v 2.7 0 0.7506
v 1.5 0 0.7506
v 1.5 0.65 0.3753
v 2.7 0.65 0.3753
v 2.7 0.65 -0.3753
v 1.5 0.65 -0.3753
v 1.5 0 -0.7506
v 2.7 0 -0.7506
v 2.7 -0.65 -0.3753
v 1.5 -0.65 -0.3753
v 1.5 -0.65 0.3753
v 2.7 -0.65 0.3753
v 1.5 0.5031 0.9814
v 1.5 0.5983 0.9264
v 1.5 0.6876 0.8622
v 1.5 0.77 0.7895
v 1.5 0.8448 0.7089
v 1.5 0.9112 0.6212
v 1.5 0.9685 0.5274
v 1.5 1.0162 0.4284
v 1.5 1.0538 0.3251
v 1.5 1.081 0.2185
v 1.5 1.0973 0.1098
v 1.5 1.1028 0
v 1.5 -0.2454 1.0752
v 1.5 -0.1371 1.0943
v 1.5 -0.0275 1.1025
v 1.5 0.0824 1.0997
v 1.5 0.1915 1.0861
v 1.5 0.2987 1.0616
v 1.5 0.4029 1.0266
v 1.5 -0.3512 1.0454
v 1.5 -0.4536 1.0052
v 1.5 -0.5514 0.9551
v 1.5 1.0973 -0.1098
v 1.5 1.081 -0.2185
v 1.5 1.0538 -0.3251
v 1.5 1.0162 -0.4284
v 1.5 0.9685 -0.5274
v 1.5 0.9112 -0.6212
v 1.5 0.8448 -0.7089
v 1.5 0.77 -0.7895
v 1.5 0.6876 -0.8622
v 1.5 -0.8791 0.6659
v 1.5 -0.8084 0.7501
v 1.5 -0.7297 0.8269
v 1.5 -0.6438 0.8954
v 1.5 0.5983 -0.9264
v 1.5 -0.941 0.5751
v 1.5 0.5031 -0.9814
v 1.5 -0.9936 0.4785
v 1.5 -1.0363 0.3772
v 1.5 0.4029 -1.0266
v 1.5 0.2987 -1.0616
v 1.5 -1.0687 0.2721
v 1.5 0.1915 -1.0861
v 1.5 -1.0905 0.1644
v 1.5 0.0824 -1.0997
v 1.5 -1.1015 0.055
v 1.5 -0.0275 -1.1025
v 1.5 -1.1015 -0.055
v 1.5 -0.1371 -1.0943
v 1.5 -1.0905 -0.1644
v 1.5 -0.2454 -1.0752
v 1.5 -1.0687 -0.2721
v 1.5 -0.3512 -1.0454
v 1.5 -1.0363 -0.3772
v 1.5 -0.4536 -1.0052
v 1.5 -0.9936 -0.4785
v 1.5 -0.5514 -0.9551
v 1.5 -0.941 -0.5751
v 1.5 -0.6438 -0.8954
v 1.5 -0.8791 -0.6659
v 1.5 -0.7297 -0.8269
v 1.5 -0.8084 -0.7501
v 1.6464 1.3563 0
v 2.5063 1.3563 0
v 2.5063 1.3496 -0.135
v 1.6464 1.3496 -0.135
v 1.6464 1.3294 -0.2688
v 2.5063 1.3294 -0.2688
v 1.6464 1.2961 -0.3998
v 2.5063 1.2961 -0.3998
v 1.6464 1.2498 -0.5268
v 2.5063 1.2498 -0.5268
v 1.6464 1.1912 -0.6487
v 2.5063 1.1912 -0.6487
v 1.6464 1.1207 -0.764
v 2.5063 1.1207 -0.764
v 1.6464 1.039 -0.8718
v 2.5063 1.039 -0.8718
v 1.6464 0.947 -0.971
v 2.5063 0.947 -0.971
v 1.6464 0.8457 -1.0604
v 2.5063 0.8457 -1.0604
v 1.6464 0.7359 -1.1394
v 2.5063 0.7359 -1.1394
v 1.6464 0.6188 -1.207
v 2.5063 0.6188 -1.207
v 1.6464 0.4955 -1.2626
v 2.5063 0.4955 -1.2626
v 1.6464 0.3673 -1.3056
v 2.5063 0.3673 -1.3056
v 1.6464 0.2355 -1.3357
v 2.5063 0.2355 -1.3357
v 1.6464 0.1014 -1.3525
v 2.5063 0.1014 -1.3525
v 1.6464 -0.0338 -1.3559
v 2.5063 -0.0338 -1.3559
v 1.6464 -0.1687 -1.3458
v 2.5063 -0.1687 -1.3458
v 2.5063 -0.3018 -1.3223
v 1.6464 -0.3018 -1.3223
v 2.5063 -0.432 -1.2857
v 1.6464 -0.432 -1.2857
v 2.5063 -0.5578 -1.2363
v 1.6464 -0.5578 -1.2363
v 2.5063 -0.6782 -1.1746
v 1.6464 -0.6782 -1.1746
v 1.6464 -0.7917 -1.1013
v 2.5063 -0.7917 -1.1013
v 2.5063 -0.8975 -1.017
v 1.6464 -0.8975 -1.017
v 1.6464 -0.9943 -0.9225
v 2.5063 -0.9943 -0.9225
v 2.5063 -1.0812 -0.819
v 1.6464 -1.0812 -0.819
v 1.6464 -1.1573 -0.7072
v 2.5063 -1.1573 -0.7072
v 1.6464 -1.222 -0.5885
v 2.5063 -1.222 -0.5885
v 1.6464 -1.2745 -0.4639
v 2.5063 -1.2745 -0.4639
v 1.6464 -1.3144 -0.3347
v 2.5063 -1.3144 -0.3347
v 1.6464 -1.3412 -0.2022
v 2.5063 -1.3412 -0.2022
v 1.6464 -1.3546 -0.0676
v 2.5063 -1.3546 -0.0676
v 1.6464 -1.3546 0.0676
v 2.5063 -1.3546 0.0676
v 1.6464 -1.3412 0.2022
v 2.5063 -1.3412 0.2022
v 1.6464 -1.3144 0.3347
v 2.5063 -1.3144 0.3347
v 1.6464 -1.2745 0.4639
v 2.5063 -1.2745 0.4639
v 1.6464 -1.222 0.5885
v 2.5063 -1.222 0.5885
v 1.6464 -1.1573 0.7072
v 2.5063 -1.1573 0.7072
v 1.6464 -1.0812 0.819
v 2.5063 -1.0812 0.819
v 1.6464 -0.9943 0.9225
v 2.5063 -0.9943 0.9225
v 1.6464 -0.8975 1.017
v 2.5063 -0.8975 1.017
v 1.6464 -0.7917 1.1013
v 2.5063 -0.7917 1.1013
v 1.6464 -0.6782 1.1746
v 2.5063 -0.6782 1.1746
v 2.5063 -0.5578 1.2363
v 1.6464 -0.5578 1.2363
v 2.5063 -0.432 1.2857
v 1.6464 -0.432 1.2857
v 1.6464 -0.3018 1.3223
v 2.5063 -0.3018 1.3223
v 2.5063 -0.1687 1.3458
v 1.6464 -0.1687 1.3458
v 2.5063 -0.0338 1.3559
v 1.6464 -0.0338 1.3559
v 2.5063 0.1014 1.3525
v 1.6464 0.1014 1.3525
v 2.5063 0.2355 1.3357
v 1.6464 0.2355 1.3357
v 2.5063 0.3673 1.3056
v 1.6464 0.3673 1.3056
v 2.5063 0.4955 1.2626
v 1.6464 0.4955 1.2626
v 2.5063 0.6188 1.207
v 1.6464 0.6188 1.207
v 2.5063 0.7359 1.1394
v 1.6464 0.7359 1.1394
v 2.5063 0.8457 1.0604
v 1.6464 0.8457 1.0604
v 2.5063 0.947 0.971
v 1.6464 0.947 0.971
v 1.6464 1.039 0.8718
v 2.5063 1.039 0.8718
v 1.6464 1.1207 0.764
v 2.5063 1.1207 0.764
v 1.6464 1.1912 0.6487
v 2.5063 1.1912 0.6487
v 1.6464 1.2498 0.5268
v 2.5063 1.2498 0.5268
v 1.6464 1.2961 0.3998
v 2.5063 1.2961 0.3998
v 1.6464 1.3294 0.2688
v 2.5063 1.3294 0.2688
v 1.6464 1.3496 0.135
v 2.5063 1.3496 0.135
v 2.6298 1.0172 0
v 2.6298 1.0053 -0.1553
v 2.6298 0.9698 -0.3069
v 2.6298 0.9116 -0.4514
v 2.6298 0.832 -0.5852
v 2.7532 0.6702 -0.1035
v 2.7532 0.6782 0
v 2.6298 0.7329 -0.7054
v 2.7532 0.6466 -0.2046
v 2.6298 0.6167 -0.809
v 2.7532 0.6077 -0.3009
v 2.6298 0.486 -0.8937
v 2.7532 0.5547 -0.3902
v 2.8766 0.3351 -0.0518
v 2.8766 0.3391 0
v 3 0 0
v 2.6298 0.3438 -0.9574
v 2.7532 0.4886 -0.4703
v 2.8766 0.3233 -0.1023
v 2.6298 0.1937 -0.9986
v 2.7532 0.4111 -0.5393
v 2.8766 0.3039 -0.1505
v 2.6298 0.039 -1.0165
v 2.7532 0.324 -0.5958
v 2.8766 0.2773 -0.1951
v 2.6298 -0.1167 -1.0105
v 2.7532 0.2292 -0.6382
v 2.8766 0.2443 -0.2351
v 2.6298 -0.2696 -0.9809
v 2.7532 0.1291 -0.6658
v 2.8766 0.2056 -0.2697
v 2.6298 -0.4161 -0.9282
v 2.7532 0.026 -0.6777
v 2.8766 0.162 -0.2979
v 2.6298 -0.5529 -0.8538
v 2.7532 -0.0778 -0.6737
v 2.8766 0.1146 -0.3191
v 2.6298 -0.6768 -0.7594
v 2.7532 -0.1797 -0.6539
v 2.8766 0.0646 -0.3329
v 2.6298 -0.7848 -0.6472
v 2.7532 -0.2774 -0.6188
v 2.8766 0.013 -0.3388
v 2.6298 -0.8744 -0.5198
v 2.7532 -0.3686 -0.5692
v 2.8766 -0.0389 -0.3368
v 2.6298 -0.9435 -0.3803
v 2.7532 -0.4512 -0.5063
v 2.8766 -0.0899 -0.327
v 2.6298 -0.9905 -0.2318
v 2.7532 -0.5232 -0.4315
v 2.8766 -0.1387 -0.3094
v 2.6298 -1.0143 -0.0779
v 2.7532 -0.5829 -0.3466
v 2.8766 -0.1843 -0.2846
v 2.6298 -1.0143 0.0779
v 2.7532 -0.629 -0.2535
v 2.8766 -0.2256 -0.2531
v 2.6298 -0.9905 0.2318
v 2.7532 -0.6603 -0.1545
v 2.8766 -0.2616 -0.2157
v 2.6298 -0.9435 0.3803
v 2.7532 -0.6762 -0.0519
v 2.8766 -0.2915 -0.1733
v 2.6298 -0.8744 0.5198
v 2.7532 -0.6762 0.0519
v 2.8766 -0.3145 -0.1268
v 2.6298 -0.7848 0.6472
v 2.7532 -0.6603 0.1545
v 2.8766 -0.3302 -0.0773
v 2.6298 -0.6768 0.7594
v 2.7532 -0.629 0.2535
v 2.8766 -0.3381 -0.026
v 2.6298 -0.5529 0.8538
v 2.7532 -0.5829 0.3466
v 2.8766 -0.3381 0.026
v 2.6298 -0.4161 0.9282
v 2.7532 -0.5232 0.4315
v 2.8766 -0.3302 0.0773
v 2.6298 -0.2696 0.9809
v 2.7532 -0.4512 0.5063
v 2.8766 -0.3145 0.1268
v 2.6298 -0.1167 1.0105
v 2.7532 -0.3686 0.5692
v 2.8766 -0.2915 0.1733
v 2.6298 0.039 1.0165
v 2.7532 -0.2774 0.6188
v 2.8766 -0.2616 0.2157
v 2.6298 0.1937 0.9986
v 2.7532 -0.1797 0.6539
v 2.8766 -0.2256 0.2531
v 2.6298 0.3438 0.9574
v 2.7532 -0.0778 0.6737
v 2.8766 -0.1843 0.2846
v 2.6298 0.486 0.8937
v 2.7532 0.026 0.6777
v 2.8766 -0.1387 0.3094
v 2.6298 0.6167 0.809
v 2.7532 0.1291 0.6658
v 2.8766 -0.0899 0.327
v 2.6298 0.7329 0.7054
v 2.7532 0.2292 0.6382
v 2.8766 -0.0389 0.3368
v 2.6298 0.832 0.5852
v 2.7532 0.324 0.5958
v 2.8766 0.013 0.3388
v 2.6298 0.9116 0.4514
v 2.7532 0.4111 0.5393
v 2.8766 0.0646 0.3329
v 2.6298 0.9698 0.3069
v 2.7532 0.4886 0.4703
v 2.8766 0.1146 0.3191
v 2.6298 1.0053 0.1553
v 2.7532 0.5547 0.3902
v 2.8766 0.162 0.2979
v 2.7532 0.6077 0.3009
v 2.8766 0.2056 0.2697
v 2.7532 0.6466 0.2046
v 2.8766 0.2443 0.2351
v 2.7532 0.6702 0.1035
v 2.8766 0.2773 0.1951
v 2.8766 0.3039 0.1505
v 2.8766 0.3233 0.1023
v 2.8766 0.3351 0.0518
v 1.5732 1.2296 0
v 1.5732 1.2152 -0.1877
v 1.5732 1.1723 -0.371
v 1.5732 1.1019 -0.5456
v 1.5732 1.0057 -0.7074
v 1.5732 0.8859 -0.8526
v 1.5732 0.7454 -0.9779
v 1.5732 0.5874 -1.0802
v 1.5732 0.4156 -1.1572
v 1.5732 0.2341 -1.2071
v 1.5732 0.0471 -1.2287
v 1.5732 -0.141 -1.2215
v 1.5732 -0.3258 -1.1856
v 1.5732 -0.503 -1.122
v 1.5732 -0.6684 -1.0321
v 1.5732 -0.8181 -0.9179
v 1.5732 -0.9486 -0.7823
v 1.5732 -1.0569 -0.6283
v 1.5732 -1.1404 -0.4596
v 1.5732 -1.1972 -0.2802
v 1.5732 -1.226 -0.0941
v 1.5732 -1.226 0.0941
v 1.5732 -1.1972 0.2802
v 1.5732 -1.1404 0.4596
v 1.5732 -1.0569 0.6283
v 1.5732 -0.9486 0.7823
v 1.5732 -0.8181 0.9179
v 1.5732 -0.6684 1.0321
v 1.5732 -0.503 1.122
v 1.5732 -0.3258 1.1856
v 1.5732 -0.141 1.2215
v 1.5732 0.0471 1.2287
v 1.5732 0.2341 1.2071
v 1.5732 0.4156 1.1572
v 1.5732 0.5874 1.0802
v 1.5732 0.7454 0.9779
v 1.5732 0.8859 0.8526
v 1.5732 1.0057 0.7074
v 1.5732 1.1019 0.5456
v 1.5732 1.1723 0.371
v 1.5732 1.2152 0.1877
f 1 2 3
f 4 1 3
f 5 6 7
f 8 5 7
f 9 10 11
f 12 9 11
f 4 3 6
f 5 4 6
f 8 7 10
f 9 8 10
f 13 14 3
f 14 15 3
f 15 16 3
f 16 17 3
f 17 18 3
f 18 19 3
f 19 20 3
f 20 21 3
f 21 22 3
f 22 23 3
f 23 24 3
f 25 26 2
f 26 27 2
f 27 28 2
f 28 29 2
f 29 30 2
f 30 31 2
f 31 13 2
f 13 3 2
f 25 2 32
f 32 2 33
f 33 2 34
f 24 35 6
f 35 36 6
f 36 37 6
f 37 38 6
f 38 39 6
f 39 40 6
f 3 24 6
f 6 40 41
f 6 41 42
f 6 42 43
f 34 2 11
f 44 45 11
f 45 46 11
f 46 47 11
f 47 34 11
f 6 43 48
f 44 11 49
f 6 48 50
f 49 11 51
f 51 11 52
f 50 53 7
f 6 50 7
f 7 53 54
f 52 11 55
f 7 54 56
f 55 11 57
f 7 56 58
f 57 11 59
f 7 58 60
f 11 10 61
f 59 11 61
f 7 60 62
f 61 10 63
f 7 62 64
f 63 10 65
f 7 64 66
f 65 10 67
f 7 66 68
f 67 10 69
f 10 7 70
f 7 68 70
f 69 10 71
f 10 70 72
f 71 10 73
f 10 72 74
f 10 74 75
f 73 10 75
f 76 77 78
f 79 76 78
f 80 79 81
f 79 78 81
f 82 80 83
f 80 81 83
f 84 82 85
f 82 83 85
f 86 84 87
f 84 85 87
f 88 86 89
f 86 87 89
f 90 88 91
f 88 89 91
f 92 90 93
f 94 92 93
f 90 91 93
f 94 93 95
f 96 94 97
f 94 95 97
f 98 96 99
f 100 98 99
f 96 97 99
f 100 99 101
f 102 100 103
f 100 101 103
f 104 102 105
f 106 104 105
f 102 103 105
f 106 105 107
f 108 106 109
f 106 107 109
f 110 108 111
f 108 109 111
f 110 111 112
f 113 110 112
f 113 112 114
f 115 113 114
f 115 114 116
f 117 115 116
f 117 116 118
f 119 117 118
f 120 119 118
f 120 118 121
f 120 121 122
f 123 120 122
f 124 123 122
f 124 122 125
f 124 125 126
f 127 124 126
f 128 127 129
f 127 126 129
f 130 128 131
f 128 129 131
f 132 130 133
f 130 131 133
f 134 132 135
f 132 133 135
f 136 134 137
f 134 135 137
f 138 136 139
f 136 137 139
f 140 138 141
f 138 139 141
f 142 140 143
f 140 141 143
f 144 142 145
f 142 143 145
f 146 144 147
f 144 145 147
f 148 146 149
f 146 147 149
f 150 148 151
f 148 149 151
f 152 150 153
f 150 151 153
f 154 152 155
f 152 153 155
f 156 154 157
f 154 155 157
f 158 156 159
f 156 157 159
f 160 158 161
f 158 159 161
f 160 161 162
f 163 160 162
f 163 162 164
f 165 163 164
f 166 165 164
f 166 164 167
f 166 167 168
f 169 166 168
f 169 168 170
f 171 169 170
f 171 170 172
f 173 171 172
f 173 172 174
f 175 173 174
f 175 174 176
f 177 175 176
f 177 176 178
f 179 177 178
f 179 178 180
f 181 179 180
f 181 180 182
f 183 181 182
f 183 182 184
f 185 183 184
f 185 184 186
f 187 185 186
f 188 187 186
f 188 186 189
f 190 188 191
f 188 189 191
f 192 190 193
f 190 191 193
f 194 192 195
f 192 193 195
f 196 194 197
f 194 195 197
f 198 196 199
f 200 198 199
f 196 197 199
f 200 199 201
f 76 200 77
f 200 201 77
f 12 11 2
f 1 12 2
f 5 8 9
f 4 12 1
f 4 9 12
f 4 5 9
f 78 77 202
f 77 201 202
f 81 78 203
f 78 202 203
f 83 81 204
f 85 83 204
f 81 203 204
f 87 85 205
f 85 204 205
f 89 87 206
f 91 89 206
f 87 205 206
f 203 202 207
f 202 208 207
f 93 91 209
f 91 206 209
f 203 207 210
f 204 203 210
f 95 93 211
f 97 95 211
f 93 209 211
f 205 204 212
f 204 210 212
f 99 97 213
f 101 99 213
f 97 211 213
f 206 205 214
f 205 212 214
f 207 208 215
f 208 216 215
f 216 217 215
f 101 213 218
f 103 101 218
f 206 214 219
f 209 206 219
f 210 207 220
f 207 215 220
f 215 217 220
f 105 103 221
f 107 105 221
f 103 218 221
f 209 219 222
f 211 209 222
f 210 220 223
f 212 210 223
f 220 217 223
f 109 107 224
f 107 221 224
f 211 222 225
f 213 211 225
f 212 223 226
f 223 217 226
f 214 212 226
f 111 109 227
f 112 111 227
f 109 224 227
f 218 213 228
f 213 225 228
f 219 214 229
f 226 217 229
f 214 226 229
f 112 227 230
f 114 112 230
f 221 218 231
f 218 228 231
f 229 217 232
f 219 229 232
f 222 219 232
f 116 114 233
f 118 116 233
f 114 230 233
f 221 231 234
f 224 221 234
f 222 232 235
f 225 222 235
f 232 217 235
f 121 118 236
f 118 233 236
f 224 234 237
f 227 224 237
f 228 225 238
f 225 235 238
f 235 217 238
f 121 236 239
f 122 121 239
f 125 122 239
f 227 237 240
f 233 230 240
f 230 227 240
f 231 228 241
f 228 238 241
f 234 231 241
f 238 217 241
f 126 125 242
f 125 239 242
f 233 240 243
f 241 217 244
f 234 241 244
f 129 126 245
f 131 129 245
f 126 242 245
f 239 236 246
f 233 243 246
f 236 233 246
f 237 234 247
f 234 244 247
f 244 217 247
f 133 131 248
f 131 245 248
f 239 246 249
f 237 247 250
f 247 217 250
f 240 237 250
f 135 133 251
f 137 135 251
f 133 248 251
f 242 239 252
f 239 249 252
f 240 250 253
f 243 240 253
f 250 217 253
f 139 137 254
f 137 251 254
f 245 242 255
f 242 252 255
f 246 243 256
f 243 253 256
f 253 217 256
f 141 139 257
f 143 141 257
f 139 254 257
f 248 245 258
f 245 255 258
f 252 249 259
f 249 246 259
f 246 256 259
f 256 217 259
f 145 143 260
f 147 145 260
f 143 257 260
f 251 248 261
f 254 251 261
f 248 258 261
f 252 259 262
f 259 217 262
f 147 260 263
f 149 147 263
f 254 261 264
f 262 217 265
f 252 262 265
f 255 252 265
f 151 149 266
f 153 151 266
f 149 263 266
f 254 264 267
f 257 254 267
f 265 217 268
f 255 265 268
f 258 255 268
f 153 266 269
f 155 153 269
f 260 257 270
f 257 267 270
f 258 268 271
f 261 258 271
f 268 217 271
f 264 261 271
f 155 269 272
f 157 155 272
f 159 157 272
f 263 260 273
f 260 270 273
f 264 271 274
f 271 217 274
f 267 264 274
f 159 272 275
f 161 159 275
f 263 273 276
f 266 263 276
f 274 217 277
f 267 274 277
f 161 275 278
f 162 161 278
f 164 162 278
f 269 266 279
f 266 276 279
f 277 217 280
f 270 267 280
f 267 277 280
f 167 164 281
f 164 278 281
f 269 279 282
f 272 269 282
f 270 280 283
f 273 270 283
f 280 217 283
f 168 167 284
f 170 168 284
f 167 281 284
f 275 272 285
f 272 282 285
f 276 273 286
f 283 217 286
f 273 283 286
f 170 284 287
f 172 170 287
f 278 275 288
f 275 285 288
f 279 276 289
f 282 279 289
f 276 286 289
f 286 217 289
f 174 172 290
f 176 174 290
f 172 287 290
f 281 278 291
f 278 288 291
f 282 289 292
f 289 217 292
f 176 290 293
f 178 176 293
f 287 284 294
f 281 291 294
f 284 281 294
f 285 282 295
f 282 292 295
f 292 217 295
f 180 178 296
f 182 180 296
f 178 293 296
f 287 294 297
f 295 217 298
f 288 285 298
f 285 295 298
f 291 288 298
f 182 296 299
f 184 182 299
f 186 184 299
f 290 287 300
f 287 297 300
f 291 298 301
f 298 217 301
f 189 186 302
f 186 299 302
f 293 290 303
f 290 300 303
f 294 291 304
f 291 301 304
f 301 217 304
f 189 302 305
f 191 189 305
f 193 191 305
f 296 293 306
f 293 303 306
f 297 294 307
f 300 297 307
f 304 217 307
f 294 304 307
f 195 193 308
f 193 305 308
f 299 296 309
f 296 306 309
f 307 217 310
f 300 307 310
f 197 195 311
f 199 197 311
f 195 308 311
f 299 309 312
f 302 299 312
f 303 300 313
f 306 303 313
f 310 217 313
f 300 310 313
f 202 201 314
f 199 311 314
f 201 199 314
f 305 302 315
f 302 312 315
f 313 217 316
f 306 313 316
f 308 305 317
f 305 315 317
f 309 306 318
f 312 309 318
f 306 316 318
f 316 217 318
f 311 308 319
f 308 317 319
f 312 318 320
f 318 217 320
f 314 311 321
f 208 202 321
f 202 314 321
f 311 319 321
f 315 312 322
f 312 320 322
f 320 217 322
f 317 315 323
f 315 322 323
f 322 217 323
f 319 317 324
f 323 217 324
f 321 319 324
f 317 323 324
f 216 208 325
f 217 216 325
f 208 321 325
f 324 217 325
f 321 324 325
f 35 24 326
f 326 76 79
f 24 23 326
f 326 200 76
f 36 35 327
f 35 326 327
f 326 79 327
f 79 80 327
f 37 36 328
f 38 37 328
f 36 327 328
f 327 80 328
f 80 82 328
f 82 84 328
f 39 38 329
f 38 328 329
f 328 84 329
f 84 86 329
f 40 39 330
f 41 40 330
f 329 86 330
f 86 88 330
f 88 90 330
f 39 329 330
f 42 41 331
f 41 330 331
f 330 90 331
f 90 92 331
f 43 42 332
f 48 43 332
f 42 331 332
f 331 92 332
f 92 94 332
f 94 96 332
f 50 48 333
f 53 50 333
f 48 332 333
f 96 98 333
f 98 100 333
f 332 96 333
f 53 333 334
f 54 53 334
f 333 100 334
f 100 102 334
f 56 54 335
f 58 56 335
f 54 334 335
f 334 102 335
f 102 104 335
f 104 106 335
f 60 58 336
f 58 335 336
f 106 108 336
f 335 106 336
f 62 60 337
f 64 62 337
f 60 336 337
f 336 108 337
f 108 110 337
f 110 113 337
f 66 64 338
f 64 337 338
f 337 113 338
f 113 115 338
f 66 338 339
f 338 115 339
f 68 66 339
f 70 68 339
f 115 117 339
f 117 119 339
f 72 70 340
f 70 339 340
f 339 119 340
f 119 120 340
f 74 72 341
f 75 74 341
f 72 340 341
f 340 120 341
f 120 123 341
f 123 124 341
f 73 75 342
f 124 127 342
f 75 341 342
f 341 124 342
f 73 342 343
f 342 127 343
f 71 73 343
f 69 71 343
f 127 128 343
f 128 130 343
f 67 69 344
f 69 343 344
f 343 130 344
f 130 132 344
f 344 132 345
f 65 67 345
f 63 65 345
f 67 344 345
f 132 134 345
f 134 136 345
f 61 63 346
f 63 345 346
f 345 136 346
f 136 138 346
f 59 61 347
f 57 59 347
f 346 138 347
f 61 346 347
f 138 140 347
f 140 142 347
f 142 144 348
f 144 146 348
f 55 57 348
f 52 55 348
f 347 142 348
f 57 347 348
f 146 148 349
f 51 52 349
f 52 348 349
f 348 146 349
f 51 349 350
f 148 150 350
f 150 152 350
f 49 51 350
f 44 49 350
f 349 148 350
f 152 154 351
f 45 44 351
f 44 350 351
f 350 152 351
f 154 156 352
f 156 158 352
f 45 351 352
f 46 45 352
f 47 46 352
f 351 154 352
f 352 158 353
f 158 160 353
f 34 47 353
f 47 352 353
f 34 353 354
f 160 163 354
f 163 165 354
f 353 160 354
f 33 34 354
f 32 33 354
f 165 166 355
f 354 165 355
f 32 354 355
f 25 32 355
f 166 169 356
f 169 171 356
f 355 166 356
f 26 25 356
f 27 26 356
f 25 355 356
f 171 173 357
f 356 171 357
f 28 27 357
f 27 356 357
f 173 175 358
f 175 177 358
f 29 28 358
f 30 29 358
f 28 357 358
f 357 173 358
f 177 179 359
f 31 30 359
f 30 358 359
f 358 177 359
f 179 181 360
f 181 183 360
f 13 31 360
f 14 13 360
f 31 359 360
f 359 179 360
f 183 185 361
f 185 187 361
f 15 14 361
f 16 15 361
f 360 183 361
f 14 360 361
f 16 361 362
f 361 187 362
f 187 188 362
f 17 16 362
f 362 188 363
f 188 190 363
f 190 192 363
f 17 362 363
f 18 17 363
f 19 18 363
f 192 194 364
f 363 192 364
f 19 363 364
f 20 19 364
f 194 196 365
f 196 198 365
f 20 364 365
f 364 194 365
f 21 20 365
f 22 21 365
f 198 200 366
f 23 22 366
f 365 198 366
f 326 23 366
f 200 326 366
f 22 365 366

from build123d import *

# Parameters (mm, degrees)
CORTE_EXTRUS_O1_DEPTH = 1.2
CHANFRO1_SIZE         = 0.2535
CHANFRO1_SIZE2        = 0.146358293


with BuildPart() as part:
    # Esboço1 → Revolução1 (revolve)
    with BuildSketch(Plane(origin=(0, 0, 0), x_dir=(-1, 0, 0), z_dir=(0, 0, -1))):
        Polygon((-2.506336445, 1.356329469), (-3, 0), (-1.5, 0), (-1.5, 1.356329469), align=None)
    revolve(axis=Axis((3, 0, 0), (-1, 0, 0)))

    # Esboço2 → Corte-extrusão1 (cut)
    with BuildSketch(Plane.ZY.offset(-1.5)):
        Polygon((0.375277675, -0.65), (0.75055535, 0), (0.375277675, 0.65), (-0.375277675, 0.65), (-0.75055535, 0), (-0.375277675, -0.65), align=None)
    extrude(amount=-CORTE_EXTRUS_O1_DEPTH, mode=Mode.SUBTRACT)

    # Chanfro1
    chanfro1_edges = [part.edges().sort_by_distance(p)[0] for p in [
        (1.5, -1.356329469, 0),
    ]]
    chanfro1_side = [part.faces().sort_by_distance(p)[0] for p in [
        (1.5, -1.317966678, 0),
    ]]
    chamfer(chanfro1_edges, length=CHANFRO1_SIZE, length2=CHANFRO1_SIZE2, reference=chanfro1_side[0])


solid = part.part
